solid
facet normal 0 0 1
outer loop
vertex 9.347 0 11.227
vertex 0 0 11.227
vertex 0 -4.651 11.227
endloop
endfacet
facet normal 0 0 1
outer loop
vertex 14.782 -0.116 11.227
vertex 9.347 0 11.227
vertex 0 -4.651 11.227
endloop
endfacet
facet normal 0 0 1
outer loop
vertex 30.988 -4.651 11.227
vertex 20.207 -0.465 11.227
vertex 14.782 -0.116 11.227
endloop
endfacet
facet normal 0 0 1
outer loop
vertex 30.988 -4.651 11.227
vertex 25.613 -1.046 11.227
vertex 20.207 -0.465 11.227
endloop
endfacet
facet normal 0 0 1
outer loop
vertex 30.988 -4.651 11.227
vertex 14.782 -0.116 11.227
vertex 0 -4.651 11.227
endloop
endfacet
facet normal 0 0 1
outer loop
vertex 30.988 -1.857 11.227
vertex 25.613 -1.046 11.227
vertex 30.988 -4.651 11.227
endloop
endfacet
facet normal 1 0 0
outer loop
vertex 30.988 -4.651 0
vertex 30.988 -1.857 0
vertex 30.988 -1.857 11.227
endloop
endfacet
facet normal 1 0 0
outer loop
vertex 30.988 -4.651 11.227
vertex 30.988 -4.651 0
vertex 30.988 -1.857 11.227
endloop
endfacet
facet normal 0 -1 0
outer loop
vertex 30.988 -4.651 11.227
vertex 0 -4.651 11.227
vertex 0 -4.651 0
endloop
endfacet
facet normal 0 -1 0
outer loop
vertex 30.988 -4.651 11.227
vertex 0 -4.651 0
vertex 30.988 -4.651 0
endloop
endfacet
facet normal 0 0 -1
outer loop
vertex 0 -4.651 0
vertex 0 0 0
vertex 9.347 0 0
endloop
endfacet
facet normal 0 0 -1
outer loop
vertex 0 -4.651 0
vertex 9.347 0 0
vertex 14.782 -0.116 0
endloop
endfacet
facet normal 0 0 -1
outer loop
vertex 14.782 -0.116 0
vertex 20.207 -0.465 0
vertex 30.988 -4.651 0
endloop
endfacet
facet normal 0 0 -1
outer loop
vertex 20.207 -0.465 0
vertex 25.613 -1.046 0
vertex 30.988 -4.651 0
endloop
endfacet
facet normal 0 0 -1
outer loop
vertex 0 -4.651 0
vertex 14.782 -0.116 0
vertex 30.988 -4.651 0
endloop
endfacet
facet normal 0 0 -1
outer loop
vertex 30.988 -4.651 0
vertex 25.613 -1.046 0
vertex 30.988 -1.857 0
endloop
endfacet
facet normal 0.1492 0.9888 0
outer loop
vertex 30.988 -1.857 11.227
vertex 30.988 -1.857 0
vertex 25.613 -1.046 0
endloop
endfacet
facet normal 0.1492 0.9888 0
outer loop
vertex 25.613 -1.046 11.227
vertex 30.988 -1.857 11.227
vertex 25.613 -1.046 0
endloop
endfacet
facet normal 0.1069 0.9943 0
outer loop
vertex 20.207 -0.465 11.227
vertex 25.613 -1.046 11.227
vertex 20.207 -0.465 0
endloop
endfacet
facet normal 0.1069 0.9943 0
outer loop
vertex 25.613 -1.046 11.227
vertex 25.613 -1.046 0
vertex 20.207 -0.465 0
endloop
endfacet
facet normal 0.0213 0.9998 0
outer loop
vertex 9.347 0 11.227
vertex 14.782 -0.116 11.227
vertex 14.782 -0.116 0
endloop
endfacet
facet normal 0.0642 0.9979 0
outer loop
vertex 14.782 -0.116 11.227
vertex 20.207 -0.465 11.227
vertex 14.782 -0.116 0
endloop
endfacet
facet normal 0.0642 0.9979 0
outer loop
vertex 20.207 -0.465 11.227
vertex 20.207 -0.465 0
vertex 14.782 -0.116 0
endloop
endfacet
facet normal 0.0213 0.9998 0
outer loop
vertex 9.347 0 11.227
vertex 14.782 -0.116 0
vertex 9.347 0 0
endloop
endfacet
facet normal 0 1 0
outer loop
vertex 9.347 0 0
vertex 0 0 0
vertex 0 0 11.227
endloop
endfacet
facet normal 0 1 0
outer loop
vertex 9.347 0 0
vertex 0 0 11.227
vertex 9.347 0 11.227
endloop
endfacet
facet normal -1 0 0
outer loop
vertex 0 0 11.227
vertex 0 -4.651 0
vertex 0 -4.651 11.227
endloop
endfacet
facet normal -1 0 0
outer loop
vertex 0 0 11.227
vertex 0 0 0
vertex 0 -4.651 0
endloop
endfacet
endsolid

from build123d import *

# Parameters (mm, degrees)
F0_W        = 30.988
F0_H        = 11.2268
F1_DEPTH    = 1.857375
F3_T1_DEPTH = 119.4307056724
F2_W        = 30.988
F2_H        = 11.2268
F4_DEPTH    = 2.794


# Not quite as in the source:
# - a fillet or chamfer that OpenCascade refuses, or shapes differently, is made with other operations: its cross-section is extruded or revolved along the edge and cut away or added


with BuildPart() as f1:
    # F0 (on Front) → F1 (new body)
    with BuildSketch(Plane.XZ):
        with Locations((15.494, 5.6134)):
            Rectangle(F0_W, F0_H)
    extrude(amount=F1_DEPTH)

    # F3: fillet of radius 127 on 1 edges, made by hand

    # F3_s2 → F3_t1 (cut)
    with BuildSketch(Plane.XY.offset(-54.1019528362)):
        with BuildLine():
            ThreePointArc((30.988, -1.857375), (20.2073897896, -0.4651957464), (9.3472188655, 0))
            Line((9.3472188655, 0), (30.988, 0))
            Line((30.988, 0), (30.988, -1.857375))
        make_face()
    extrude(amount=F3_T1_DEPTH, mode=Mode.SUBTRACT)

    # F2 (on face) → F4 (join)
    with BuildSketch(Plane.XZ.offset(1.857375)):
        with Locations((15.494, 5.6134)):
            Rectangle(F2_W, F2_H)
    extrude(amount=F4_DEPTH)


solid = f1.part
